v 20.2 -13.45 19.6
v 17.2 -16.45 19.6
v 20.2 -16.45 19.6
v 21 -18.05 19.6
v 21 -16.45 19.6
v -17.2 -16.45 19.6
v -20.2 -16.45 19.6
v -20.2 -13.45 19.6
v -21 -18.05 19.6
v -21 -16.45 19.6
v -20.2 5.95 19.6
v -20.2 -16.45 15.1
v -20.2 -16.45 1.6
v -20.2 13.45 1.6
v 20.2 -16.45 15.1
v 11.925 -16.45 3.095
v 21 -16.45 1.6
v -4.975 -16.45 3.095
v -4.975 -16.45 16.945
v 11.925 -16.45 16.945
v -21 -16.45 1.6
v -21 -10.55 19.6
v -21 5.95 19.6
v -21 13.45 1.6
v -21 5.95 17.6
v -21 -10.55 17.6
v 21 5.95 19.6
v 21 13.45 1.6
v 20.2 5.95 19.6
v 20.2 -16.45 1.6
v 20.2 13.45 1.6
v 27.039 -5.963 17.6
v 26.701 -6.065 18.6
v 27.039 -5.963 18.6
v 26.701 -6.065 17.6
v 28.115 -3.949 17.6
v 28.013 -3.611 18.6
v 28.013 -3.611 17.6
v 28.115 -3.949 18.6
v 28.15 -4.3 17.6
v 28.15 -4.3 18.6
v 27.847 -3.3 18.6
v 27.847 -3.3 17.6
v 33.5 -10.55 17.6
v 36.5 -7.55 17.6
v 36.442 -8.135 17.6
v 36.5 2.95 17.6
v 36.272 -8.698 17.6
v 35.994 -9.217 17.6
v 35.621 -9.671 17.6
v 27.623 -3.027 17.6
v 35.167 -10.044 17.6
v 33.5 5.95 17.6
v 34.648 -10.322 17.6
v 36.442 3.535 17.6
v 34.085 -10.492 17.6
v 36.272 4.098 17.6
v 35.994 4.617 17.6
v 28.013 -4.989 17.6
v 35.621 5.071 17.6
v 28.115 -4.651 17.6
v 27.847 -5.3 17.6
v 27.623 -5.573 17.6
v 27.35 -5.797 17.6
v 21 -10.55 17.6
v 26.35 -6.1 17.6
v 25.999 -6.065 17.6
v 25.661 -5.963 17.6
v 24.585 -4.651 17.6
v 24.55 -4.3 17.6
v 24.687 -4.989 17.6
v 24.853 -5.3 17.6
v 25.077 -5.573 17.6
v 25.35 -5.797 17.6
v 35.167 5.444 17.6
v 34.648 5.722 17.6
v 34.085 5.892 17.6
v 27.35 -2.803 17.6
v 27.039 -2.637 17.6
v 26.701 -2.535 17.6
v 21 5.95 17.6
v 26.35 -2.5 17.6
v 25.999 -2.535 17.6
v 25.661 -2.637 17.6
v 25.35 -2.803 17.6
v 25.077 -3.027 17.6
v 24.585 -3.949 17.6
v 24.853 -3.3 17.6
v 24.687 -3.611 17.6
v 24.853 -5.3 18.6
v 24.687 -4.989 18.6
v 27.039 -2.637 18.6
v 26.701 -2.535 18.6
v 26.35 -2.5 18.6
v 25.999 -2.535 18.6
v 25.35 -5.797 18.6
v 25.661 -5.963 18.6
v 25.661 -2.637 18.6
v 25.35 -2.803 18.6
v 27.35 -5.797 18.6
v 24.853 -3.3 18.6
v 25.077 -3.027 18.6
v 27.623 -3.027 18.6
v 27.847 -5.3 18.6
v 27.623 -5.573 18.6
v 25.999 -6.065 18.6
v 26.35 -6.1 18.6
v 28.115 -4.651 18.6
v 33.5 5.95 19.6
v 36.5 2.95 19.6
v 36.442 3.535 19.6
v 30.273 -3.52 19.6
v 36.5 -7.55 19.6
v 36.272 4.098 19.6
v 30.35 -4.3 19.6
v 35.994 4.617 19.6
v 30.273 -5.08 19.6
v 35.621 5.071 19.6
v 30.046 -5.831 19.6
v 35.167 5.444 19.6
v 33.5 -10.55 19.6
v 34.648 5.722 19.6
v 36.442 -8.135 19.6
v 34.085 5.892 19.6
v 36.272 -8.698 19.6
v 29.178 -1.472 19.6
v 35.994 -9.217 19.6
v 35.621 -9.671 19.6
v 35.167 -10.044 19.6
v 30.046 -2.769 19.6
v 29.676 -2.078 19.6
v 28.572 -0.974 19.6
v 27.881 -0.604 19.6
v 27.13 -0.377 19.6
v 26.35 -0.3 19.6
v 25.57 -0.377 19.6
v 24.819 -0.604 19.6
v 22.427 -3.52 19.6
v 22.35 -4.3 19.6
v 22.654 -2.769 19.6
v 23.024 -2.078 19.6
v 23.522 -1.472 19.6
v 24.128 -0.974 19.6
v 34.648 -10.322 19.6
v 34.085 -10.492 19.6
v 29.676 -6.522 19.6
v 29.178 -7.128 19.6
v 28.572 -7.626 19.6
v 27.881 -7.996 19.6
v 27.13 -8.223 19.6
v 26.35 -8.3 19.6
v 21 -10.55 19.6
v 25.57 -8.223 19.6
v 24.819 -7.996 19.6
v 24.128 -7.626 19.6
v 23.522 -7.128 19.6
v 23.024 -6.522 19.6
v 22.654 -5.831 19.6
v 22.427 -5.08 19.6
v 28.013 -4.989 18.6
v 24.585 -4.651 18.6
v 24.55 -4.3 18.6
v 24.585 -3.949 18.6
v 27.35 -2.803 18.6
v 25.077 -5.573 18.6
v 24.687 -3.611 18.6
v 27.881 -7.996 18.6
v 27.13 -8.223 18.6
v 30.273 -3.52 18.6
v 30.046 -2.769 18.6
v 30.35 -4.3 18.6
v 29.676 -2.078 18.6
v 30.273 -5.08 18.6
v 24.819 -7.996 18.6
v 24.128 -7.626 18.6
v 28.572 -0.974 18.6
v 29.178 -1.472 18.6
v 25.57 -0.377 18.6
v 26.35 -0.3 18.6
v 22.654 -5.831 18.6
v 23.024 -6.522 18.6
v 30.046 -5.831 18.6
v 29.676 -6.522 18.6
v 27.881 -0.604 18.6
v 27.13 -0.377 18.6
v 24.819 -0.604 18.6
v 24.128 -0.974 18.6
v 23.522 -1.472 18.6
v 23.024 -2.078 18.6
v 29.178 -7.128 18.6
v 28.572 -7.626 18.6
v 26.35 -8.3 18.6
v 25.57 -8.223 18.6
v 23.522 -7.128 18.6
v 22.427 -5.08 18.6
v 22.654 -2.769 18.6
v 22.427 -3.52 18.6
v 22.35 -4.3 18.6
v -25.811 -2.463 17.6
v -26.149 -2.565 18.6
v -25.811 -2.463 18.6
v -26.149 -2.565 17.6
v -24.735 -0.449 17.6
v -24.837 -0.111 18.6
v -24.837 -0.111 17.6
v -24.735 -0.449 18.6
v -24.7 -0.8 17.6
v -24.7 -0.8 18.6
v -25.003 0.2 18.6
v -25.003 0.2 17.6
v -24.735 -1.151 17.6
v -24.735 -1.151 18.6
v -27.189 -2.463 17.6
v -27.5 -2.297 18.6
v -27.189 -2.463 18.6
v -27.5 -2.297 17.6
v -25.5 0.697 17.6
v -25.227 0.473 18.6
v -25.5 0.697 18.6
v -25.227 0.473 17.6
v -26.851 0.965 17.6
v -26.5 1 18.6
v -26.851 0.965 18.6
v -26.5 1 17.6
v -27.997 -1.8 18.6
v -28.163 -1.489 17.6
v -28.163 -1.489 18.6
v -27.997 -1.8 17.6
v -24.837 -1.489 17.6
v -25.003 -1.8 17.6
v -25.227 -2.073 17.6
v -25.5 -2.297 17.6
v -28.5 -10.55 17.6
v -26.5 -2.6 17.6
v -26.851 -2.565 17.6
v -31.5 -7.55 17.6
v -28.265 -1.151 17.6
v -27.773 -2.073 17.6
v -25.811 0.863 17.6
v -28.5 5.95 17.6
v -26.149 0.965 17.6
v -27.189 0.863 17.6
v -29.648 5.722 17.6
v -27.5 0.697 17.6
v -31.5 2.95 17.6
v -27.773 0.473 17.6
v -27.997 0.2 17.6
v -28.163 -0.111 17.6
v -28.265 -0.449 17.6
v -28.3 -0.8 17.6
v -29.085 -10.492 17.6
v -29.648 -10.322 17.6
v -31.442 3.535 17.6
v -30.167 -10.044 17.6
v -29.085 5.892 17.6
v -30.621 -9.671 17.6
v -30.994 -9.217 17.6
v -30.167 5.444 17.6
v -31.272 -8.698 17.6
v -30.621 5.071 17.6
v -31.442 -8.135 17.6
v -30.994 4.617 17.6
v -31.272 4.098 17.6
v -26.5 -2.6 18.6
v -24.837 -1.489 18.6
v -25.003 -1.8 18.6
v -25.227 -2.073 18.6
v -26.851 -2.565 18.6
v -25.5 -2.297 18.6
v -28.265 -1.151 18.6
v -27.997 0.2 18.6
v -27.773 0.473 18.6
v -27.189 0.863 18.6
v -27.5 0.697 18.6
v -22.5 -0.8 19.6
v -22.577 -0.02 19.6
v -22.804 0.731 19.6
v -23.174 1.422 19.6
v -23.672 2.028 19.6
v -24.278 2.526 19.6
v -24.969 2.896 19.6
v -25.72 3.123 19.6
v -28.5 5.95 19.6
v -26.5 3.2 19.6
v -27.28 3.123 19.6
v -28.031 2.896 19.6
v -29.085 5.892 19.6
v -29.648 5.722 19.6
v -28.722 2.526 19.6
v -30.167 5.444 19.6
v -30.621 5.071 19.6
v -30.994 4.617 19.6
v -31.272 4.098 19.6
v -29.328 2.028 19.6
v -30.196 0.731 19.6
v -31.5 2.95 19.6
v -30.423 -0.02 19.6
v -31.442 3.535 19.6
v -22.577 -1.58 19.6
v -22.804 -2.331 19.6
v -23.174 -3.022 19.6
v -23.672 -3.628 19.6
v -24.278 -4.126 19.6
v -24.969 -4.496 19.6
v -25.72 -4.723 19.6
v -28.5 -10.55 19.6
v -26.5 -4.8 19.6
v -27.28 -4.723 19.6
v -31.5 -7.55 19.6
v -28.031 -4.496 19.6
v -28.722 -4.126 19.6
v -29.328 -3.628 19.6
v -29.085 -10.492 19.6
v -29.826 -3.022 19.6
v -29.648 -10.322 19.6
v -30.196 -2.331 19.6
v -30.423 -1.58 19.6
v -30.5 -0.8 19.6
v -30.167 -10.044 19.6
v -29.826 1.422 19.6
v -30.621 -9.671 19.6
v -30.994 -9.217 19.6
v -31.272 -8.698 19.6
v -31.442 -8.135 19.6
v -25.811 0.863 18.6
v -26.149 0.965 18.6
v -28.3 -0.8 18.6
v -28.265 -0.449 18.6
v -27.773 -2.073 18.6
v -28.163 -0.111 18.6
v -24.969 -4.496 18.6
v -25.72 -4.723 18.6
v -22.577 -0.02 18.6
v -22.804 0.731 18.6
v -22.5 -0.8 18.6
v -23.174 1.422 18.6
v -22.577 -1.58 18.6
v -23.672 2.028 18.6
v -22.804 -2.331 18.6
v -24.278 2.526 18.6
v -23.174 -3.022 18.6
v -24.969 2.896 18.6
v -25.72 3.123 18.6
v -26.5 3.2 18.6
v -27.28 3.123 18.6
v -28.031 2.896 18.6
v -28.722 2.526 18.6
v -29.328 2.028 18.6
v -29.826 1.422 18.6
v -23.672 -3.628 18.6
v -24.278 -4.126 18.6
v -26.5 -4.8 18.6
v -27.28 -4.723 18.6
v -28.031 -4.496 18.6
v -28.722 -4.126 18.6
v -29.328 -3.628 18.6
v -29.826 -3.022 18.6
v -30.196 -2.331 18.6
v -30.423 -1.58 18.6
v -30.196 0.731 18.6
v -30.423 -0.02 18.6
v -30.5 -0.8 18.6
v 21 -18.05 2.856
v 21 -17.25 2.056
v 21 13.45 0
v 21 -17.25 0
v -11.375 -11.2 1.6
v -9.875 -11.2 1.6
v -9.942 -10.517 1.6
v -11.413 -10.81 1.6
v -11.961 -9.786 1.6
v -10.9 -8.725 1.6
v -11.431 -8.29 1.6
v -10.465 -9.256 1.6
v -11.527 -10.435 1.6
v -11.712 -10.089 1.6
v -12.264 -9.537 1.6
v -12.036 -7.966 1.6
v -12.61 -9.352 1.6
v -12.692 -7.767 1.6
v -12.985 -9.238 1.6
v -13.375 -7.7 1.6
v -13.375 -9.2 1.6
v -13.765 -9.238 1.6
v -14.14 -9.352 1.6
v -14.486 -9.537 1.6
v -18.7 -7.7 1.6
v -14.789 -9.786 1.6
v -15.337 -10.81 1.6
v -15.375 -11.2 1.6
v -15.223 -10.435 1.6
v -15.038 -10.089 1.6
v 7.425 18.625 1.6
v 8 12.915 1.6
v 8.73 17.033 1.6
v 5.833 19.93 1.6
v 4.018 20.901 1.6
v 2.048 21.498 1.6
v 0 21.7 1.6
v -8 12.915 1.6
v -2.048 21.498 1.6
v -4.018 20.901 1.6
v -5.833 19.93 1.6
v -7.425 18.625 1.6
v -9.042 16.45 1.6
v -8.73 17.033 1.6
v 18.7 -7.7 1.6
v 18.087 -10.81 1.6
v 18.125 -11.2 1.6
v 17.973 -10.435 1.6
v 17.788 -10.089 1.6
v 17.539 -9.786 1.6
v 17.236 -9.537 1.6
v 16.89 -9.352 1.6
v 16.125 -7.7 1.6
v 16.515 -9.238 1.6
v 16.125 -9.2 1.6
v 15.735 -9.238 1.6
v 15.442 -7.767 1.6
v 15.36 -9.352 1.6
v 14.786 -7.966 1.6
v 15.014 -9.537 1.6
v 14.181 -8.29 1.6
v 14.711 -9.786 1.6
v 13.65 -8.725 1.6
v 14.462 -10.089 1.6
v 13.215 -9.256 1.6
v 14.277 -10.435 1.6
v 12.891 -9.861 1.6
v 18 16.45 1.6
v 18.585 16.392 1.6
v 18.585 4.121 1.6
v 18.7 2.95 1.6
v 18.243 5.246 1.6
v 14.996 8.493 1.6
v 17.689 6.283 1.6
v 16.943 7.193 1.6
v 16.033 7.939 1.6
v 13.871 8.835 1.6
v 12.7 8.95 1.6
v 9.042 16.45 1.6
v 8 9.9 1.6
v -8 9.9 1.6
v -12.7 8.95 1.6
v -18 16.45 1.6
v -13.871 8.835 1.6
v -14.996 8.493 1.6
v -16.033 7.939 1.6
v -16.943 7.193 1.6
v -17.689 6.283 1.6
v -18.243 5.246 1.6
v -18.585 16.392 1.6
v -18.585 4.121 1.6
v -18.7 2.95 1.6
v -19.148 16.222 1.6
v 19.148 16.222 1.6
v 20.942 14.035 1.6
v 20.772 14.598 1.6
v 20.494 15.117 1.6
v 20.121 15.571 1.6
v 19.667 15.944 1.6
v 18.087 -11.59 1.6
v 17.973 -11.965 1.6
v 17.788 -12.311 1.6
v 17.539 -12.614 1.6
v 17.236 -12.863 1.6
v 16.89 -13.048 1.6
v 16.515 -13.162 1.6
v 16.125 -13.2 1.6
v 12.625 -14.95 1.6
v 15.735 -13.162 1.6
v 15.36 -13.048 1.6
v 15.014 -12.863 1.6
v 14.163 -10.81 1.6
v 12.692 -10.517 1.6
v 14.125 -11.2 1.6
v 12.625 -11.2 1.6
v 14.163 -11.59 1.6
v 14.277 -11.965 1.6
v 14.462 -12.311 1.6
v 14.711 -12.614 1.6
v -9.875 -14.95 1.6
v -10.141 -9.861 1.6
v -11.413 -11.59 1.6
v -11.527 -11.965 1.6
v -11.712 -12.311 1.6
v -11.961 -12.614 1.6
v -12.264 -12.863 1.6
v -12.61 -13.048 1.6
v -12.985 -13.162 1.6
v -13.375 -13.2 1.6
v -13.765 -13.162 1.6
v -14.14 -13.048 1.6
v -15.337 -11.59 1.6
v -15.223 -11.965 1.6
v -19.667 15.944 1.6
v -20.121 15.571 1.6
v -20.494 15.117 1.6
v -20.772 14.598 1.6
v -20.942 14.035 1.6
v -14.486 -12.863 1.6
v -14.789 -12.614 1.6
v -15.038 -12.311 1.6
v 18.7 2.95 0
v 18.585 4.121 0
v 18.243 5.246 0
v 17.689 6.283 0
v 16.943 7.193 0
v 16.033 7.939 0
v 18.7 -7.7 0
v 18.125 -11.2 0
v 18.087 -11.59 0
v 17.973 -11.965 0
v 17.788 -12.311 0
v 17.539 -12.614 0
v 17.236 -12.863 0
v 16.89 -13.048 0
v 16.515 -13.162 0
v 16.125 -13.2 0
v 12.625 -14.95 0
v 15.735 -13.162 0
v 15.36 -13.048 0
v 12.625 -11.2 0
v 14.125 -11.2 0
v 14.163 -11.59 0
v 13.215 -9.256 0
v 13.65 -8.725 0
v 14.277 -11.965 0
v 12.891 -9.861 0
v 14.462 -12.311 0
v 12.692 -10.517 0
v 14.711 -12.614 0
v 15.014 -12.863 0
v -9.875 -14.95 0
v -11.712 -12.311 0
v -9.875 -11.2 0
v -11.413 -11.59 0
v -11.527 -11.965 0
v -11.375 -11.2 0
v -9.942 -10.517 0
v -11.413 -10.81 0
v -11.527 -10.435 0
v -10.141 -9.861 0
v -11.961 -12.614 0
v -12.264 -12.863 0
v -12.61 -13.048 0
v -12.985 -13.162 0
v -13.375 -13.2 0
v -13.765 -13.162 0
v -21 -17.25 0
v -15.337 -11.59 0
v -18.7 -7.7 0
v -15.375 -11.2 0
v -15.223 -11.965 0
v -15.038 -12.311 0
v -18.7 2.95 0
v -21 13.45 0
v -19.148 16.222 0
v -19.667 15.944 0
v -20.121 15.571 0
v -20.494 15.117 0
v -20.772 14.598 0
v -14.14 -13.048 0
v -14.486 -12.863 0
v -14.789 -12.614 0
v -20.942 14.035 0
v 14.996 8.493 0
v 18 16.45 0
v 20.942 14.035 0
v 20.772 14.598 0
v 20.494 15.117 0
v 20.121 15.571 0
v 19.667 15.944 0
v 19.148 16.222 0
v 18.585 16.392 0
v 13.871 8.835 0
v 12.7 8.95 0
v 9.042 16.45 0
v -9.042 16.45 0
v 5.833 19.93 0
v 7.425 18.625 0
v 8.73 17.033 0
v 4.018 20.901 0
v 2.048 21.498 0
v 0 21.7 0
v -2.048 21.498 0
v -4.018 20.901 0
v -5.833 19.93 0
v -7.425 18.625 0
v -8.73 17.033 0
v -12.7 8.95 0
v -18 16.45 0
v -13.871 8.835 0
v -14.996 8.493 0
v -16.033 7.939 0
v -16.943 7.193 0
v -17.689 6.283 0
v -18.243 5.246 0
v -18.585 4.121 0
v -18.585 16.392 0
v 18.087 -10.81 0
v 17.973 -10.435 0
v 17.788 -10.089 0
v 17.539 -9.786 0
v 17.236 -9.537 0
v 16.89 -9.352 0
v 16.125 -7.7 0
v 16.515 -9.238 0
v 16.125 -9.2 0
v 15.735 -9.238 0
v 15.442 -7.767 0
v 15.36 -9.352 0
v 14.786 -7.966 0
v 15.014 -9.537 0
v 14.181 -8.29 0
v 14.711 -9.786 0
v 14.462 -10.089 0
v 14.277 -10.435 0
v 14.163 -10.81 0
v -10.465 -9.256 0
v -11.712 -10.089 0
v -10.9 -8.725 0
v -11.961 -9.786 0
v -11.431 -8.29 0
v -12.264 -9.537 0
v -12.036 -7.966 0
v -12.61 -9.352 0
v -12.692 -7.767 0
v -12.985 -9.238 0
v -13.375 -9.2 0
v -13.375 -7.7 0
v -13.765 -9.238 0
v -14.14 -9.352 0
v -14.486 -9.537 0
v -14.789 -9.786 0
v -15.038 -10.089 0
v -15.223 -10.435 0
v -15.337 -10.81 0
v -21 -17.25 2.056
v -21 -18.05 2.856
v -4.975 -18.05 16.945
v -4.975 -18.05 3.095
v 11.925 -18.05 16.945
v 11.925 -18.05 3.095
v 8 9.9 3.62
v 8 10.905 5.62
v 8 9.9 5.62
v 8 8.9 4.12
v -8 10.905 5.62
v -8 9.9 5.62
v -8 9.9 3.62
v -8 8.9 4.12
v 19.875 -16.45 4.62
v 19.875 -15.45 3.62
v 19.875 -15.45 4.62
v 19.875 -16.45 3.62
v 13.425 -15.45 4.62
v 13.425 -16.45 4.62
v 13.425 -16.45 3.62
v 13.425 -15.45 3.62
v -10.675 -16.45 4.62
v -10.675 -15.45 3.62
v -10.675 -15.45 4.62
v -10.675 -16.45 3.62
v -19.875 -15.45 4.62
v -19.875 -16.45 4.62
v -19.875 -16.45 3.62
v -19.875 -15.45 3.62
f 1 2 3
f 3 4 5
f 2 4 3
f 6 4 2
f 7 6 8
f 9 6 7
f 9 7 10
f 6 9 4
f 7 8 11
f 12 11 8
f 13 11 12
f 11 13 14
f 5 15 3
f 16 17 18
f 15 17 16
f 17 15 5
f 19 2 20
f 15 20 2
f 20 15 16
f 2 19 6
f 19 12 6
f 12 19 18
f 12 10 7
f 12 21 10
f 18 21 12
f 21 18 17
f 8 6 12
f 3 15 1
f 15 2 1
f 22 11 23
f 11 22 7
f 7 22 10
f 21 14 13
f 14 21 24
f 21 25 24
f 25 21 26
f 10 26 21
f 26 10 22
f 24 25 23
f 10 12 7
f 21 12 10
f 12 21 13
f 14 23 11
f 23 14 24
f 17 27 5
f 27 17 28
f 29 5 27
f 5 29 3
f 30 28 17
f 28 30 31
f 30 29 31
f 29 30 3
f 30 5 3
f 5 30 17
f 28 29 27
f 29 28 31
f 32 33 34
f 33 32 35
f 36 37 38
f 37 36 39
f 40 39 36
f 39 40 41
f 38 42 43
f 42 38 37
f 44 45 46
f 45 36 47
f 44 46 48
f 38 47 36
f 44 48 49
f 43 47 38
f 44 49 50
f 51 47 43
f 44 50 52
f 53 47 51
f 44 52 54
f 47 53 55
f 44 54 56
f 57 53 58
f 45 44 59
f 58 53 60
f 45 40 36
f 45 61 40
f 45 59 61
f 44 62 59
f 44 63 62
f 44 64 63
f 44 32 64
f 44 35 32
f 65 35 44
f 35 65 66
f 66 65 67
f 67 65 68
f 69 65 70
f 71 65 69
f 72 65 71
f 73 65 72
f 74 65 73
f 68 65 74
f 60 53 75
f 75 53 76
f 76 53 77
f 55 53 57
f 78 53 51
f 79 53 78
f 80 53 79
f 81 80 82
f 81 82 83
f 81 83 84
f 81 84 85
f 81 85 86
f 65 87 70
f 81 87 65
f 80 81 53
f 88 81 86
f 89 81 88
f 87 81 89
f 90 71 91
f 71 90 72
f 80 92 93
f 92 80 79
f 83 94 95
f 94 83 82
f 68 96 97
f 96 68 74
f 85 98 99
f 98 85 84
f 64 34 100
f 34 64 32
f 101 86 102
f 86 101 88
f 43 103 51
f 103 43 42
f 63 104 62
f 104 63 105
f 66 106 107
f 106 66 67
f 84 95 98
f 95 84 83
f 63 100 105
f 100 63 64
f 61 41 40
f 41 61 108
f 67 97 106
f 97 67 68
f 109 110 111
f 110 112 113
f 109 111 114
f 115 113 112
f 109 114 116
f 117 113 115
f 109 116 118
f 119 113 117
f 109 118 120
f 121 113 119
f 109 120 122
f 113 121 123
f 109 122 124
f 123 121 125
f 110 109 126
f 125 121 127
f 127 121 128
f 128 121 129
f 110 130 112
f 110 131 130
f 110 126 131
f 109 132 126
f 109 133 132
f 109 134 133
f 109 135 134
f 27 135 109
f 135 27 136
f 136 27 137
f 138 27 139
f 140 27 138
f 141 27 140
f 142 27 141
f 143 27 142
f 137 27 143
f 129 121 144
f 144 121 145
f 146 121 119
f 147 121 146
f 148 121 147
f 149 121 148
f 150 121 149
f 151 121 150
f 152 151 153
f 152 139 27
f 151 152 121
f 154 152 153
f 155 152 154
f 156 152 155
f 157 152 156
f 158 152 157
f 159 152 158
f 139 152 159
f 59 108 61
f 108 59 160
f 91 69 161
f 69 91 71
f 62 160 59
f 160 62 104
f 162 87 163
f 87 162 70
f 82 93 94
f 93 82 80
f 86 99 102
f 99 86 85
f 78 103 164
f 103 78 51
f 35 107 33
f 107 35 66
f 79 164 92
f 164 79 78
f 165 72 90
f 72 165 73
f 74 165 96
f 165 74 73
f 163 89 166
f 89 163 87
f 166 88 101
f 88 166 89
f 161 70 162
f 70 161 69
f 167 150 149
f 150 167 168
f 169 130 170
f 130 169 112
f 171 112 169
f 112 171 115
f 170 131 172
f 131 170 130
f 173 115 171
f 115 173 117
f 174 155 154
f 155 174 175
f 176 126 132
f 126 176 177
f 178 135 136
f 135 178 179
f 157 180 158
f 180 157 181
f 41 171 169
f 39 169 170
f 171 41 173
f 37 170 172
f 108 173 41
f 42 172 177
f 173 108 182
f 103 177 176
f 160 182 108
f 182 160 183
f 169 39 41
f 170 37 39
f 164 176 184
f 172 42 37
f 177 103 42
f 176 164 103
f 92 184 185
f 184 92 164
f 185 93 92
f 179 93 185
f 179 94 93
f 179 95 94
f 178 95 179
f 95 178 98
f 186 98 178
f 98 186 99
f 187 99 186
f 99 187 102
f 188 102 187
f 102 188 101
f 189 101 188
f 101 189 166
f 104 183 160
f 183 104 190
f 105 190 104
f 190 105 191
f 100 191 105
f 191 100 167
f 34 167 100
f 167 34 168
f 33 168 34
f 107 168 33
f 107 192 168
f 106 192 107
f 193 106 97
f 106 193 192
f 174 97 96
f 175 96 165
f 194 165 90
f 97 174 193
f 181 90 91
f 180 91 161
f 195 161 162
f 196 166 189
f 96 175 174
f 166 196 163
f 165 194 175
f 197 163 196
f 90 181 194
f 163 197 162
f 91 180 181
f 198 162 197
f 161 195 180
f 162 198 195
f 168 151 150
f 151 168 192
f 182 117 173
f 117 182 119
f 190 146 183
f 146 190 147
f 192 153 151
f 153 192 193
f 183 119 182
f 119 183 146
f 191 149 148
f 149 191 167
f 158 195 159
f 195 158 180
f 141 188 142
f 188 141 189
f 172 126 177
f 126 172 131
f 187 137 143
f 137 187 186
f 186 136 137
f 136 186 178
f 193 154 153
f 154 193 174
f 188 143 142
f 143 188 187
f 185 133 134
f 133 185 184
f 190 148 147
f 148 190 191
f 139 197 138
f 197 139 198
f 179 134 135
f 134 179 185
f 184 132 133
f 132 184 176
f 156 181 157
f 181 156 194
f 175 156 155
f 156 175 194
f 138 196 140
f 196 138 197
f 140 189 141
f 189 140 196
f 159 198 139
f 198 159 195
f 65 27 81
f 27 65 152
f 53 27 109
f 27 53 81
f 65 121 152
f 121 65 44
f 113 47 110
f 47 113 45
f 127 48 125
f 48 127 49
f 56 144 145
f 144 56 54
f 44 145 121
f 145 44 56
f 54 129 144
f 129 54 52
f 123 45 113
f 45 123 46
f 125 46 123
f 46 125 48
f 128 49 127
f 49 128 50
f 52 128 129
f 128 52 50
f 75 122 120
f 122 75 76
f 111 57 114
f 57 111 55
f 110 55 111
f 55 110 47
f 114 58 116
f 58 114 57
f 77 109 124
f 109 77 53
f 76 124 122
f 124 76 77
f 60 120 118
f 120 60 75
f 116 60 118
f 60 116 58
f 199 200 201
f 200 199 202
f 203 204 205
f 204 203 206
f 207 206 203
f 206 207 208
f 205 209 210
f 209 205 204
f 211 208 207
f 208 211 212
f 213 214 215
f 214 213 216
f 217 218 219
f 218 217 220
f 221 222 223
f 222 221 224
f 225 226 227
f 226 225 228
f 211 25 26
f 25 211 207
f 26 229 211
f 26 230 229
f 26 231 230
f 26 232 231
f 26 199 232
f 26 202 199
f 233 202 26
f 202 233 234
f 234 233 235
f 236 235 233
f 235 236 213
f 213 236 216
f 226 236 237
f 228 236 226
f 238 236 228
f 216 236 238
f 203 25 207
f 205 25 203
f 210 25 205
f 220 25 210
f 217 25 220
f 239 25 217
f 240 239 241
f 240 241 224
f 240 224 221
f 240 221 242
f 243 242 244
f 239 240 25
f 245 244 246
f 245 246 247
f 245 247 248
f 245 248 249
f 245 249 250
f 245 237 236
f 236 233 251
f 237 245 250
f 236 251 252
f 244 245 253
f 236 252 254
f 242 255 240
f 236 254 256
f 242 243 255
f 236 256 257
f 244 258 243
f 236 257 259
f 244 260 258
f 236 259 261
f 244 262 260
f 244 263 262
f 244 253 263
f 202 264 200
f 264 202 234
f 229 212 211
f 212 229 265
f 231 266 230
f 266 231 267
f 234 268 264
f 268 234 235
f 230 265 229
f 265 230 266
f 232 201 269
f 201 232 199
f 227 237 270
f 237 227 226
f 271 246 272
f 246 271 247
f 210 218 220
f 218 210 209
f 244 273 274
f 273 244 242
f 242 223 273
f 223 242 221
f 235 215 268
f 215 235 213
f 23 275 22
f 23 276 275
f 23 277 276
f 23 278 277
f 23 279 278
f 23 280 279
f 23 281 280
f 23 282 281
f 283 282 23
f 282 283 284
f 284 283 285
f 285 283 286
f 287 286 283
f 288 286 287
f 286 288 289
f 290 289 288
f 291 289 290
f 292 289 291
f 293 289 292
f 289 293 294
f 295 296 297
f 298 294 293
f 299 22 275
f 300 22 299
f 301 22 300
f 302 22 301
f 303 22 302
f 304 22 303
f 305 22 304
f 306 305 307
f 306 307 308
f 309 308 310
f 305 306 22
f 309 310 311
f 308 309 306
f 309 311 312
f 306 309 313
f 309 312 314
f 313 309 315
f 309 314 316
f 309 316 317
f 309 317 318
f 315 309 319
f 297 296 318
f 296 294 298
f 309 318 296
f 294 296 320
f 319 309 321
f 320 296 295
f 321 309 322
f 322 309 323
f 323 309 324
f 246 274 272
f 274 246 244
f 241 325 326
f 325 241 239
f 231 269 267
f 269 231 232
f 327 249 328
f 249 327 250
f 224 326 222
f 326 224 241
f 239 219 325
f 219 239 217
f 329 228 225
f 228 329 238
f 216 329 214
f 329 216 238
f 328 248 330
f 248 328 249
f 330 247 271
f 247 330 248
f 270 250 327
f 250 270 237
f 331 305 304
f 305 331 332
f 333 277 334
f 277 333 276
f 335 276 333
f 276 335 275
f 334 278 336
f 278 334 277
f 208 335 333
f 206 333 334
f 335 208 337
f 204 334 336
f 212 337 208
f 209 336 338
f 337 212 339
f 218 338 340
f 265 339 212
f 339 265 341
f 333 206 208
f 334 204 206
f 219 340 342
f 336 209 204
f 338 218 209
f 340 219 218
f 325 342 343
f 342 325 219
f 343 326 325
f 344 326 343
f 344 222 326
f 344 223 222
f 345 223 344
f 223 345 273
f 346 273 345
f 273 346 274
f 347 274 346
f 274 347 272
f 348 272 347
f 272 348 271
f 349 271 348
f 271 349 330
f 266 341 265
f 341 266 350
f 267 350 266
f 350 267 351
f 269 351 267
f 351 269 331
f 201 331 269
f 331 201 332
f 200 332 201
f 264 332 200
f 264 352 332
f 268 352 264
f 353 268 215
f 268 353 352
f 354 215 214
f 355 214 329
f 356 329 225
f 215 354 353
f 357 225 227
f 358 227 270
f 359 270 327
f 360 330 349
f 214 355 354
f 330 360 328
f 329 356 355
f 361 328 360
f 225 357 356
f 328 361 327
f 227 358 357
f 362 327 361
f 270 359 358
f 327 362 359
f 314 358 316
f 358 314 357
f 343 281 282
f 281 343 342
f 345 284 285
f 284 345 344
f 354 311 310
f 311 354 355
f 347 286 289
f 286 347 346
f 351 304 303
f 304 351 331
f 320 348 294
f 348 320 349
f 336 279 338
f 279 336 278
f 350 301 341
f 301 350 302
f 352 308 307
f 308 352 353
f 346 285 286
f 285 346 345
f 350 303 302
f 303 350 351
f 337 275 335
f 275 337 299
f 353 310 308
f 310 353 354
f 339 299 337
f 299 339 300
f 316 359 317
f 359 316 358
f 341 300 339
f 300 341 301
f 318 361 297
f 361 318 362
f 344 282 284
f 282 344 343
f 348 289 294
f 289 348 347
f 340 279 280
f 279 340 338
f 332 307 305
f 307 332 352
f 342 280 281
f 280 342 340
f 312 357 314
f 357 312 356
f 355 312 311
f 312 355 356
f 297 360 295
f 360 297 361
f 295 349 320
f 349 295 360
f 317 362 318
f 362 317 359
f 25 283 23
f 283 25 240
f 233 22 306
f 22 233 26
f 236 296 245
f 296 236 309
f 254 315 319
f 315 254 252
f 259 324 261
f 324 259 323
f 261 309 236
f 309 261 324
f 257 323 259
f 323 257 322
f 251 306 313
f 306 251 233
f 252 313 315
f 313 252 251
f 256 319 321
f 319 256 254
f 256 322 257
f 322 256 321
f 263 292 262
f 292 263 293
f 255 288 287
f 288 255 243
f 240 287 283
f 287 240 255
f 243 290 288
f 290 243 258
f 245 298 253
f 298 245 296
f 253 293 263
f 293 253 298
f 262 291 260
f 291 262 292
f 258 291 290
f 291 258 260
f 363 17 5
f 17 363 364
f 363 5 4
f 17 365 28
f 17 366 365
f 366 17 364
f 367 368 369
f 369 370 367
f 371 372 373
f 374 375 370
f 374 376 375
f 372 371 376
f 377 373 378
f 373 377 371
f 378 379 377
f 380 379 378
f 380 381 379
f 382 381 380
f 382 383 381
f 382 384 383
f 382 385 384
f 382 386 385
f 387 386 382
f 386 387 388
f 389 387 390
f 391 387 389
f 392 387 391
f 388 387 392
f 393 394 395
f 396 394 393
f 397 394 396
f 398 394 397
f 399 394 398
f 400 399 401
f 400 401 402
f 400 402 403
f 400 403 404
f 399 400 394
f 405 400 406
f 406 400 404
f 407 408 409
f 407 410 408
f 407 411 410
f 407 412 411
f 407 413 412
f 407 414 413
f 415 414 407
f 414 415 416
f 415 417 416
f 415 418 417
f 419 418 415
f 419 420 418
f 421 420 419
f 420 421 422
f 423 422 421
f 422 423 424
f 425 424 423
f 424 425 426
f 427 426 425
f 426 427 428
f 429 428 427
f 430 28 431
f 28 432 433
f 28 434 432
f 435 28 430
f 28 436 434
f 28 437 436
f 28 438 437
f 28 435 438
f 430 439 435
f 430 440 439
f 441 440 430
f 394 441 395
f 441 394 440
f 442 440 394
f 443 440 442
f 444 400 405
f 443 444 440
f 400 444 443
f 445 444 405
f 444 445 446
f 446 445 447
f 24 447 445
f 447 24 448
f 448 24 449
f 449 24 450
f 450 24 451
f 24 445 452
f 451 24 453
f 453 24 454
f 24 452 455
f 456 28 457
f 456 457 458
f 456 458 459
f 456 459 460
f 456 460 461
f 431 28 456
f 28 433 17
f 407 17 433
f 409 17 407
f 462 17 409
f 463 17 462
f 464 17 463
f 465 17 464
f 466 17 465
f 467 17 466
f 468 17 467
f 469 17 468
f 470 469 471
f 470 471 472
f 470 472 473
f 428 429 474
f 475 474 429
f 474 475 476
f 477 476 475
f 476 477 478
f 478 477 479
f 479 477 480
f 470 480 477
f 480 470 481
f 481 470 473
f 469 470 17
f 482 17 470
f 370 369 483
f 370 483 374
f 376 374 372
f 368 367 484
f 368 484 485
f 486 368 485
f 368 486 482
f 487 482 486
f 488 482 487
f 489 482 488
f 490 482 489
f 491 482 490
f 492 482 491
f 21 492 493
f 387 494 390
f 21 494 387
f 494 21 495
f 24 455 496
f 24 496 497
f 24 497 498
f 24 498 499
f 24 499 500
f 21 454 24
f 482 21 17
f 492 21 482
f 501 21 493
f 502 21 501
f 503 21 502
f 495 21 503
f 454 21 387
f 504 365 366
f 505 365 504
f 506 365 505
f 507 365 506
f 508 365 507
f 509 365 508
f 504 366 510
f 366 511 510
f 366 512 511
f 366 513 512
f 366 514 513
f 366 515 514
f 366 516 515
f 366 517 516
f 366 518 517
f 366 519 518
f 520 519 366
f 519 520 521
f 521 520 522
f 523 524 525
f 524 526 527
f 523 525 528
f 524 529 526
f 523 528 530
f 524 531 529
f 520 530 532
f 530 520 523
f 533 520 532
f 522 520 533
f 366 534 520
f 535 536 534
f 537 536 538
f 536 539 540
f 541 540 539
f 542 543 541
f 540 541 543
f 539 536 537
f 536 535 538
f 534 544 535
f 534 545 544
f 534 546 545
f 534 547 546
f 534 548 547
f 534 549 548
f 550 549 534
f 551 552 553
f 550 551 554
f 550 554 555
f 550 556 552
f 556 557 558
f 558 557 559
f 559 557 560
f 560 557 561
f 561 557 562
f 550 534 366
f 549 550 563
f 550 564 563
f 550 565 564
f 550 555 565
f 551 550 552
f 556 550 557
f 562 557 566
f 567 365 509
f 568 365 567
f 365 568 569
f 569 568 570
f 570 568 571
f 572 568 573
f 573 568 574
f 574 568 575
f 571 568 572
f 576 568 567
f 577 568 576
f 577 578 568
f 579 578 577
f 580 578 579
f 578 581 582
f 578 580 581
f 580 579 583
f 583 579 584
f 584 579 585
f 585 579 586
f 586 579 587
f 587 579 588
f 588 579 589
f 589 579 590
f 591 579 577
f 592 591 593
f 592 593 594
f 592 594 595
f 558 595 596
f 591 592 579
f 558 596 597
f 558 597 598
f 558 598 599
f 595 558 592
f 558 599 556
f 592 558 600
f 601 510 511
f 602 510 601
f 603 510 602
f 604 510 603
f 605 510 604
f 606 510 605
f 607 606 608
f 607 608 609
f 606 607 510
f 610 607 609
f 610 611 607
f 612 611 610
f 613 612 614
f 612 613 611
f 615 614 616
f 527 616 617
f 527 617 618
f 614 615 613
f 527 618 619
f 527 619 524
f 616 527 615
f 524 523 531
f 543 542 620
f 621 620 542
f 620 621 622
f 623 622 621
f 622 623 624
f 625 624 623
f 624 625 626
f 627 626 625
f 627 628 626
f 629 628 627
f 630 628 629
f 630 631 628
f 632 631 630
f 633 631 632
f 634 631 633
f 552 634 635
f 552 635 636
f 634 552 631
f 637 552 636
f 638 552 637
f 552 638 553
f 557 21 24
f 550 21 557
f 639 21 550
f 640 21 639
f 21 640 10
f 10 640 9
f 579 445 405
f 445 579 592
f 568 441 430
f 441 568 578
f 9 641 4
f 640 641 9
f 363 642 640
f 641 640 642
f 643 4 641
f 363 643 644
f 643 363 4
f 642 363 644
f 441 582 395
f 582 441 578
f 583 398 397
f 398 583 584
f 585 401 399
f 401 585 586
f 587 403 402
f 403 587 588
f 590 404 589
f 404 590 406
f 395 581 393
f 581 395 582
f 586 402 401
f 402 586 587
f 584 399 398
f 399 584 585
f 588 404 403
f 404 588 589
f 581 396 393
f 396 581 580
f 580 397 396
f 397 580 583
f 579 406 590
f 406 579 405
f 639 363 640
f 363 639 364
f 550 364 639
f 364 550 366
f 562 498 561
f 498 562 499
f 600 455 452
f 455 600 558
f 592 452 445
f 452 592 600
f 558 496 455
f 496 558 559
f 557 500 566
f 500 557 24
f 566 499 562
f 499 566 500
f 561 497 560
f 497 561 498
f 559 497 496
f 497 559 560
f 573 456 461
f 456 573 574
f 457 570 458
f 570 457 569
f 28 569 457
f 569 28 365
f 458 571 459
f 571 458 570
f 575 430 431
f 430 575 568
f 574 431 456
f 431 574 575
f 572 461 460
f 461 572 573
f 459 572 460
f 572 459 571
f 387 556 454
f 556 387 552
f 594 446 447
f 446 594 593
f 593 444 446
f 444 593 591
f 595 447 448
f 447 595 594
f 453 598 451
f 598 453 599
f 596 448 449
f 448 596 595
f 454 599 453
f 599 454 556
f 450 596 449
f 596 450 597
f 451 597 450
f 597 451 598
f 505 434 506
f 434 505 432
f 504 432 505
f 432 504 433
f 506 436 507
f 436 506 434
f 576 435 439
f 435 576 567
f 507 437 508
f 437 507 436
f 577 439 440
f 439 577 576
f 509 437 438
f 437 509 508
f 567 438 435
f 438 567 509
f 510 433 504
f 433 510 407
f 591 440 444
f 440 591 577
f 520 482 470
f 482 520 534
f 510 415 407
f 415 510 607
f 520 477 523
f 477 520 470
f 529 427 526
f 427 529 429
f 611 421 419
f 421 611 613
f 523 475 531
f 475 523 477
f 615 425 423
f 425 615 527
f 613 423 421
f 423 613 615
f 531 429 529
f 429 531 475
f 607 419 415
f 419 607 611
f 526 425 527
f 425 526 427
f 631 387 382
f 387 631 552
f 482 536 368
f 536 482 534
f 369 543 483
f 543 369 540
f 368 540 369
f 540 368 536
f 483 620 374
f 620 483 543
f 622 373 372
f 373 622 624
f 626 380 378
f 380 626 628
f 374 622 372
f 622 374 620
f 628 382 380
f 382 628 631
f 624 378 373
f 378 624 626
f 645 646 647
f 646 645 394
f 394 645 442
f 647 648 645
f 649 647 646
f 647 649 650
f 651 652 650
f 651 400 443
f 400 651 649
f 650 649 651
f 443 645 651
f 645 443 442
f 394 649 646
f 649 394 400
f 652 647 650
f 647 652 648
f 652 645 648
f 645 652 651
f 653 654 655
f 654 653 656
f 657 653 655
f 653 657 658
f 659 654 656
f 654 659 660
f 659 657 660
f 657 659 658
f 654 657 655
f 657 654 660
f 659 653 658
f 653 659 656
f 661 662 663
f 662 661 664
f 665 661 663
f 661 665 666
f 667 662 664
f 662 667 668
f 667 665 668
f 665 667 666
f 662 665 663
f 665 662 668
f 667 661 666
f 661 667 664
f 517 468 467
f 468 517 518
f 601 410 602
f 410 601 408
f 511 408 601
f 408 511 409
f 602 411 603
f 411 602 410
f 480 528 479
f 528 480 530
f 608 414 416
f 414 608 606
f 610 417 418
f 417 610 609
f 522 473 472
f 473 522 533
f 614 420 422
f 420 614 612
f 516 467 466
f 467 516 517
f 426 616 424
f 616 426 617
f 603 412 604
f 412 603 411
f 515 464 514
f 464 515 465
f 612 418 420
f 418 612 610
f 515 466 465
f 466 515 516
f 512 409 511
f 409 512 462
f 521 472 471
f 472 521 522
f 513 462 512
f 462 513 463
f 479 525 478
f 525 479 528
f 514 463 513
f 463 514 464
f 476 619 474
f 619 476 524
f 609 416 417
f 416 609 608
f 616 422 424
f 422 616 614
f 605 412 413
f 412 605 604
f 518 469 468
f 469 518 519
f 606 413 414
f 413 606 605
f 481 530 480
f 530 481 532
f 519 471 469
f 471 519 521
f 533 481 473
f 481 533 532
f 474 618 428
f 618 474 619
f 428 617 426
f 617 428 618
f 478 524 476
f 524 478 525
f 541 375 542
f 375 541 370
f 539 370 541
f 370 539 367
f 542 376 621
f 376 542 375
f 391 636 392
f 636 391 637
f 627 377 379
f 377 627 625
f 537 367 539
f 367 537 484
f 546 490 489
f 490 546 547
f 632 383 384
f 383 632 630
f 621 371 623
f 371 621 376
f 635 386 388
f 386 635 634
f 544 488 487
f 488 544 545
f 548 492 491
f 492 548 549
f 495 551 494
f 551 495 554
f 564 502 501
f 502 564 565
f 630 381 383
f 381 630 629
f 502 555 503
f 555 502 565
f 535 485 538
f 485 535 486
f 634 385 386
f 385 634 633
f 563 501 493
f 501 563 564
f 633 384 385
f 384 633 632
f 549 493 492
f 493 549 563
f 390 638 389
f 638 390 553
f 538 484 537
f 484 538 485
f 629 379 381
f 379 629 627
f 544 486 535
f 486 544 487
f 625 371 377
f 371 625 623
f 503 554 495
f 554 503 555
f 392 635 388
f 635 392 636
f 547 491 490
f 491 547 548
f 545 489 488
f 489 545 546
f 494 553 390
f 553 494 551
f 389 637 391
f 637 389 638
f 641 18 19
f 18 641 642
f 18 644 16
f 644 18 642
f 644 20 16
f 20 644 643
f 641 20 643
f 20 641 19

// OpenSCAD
// file: hash.scad
//
// Copyright (c) Stewart H. Whitman, 2020-2021.
//
// File:    hash.scad
// Project: General
// License: CC BY-NC-SA 4.0 (Attribution-NonCommercial-ShareAlike)
// Desc:    Implementation of a hash associative array.
//

// hash can be initialized like:
//
//   config = hash_add( hash_add( hash_add( hash_add( hash_initialize(), "first_name", "Bob" ), "last_name", "Doe" ), "age", 50 ), "kids", [ "Jane", "John" ] );
//
// or perhaps more simply like:
//
//   config = [
//     [ "first_name", "Bob" ],
//     [ "last_name", "Doe" ],
//     [ "age", 50 ],
//     [ "kids", [ "Jane", "John" ] ],
//   ];
//
// Then values can be retrieved by:
//
//   echo( hash_get( config, "first_name" ) ); // -> "Bob"
//
// Default values can be obtained as follows if the key is missing from the hash:
//
//   echo( hash_get_default( config, "age", 0 ) ); // -> 50
//   echo( hash_get_default( config, "occupation", "unknown" ) ); // -> "unknown"
//
// Or, you can have an entire hash of default values to fallback on:
//
//   default_config = [
//     [ "first_name", "none" ],
//     [ "last_name", "none" ],
//     [ "age", -1 ],
//     [ "occupation", "unknown" ],
//     [ "kids", [] ],
//   ];
//
//   echo( hash_get_default_hash( config, "age", default_config ) ); // -> 50
//   echo( hash_get_default_hash( config, "occupation", default_config ) ); // -> "unknown"
//
// Functions like 'hash_set' and 'hash_delete' require you to assign the returned result
// to a new variable, since openscad does not have true variables.
//
//   anon_config = hash_delete( hash_delete( config, "first_name" ), "last_name" );
//   echo( hash_exists( anon_config, "first_name" ) ); // -> false
//
// Most of the other functions are obvious.
//

// hash_initialize:
//
// Returns initialization of a hash.
//
function hash_initialize() = [];

// hash_add:
//
// Adds <key>:<value> to <hash>. This does not check for duplicates. Use hash_set to remove duplicates.
//
function hash_add( hash, key, value ) = assert( is_list(hash) ) is_undef(key) ? hash : concat( hash, [[key, value]] );

// hash_size:
//
// Returns the size of <hash>.
//
function hash_size( hash ) = assert( is_list(hash) ) len(hash);

// hash_is_empty:
//
// Returns true if <hash> is empty.
//
function hash_is_empty( hash ) = assert( is_list(hash) ) len(hash) == 0;

// hash_keys:
//
// Return the keys of <hash> in an array.
//
function hash_keys( hash ) = assert( is_list(hash) ) [ for( i = hash ) i[0] ];

// hash_values:
//
// Return the values of <hash> in an array.
//
function hash_values( hash ) = assert( is_list(hash) ) [ for( i = hash ) i[1] ];

// hash_get:
//
// Returns the value associated with key <key> from <hash> or undef if it does not exist.
//
function hash_get( hash, key ) = assert( is_list(hash) ) hash[ search( [key], hash, 1, 0 )[0] ][1];

// hash_exists:
//
// Returns true if the key <key> exists in <hash>.
//
function hash_exists( hash, key ) = assert( is_list(hash) ) search( [key], hash, 1, 0 ) != [[]];

// hash_get_default:
//
// Returns the value associated with key <key> from <hash> or <default_value> if it does not exist.
//
function hash_get_default( hash, key, default_value ) = hash_exists( hash, key ) ? hash_get( hash, key ) : default_value;

// hash_get_default_hash:
//
// Returns the value associated with key <key> from <hash>, falling back to <default_hash> if it does not exist.
//
function hash_get_default_hash( hash, key, default_hash ) = hash_exists( hash, key ) ? hash_get( hash, key ) : hash_get( default_hash, key );

// hash_delete:
//
// Deletes key <key> from <hash> if it exists and returns the new hash.
//
function hash_delete( hash, key ) = assert( is_list(hash) ) [ for( i = hash ) if( key != i[0] ) i ];

// hash_set:
//
// Set key <key> to associated <value> in <hash>, deleting it if it already exists,  and returns the new hash.
//
function hash_set( hash, key, value ) = hash_exists( hash, key ) ? hash_add( hash_delete( hash, key ), key, value ) : hash_add( hash, key, value );
// file: primitives.scad
//
// Copyright (c) Stewart H. Whitman, 2020-2021.
//
// File:    primitives.scad
// Project: Dell Wyse 5070 2nd Ethernet Adapter Adapter
// License: CC BY-NC-SA 4.0 (Attribution-NonCommercial-ShareAlike)
// Desc:    Shape primitives
//
// $Header$
//

include <smidge.scad>;

// Creates a right triangle with <height> and <base> and extrudes it
// to <thickness>.
//
module right_triangle(height, base, thickness) {
  translate( [+thickness,0,0] ) rotate( [0,-90,0] ) linear_extrude( height=thickness ) polygon( [[0,0], [0,height], [base,0]] );
} // end right_triangle

// Create a half cylinder
module half_cylinder(r,h,center=false) {
  translate( [center ? -h/2 : 0, 0, 0] )
    rotate( [90,0,0] ) rotate( [0,90,0] )
    difference() {
      cylinder( r=r, h=h );
      translate( [-2*r,-r, -SMIDGE ] ) cube( [ 2*r,2*r,h+2*SMIDGE] );
    }
} // end half_cylinder

// Create a triangle with 2 sides the same
module equi_triangle(height_and_base, thickness,center=false) {
  translate( [ center ? -thickness/2 : 0, 0, 0 ] ) {
    right_triangle(height_and_base, height_and_base, thickness);
    mirror( [0,0,1] ) right_triangle(height_and_base, height_and_base, thickness);
  }
} // end equi_triangle

// Create a somewhat complex tang (a right triangle over a cube)
module tang(l,h,w,percent=25,center=false) {
  assert( percent > 0 && percent < 100 );
  //echo( ["tang",l,w,h,percent] );

  p = percent/100;

  translate( [-w/2,0,center?-h/2 : 0] ) {
    translate( [0,0,p*h] )
      right_triangle(l,(1-p)*h,w);
    cube( [w,l,p*h] );
  }
} // end tang

// Create a somewhat complex tang (a right triangle over another triangle)
module tang2(l,h,w,percent=25,center=false) {
  assert( percent > 0 && percent < 100 );
  //echo( ["tang2",l,h,w,percent] );

  p = percent/100;

  translate( [-w/2,0,center?-h/2 : 0] ) {
    translate( [0,0,p*h] )
      right_triangle(l,(1-p)*h,w);
    translate( [0,0,p*h] )
      mirror( [0,0,1] ) right_triangle(l,p*h,w);
  }
} // end tang2

// Create a gusset (pyramid that fits in corner)
module gusset(width,height=0,center=true) {
  w = width;
  h = height == 0 ? w : height;
  translate( [0,0,center?-h/2:0] )
    polyhedron( points=[[0,0,0], [w,0,h], [0,0,h], [0,w,h]],
                faces=[[1,2,3],[0,1,3],[0,2,1],[0,3,2]] );
} // end gusset

// A corner rounding shape for a designated corner (on the XY plane)...
module round_corner_xy(radius,v,direction) {
  assert( direction >= 0 && direction <= 3 );

  if( radius > 0 ) {
    // Additional amount on Z
    z_multiplier = 2;
    z_translate  = [ [-1, -1, 0], [+1, -1, 0], [+1, +1, 0], [-1, +1, 0] ];

    // Get an inverted quarter pie slice
    color( "purple" )
    translate( [v.x,v.y,0] )
      translate( z_translate[direction]*radius )
	rotate( [0,0,90*direction] )
	  difference() {
	    translate( [0,0,-v.z*z_multiplier/4] ) cube( [radius+SMIDGE,radius+SMIDGE,v.z*z_multiplier] );
	    translate( [0,0,v.z*z_multiplier/4] ) cylinder( v.z*z_multiplier+SMIDGE, r=radius, center=true );
	  }
  }
} // end round_corner_xy

// A corner rounding shape for a designated corner (on the YZ plane)...
module round_corner_yz(radius,v,direction) {
  assert( direction >= 0 && direction <= 3 );

  if( radius > 0 ) {
    // Additional amount on X
    x_multiplier = 2;
    x_translate  = [ [0, -1, +1], [0, -1, -1], [0, +1, -1], [0, +1, +1] ];

    // Get an inverted quarter pie slice
    color( "purple" )
      translate( [0,v.y,v.z] )
	translate( x_translate[direction]*radius )
	  rotate( [90*direction,0,0] )
	  rotate( [0,90,0] )
	    difference() {
	      translate( [0,0,-v.x*x_multiplier/4] ) cube( [radius+SMIDGE,radius+SMIDGE,v.x*x_multiplier] );
	      translate( [0,0,v.x*x_multiplier/4] ) cylinder( v.x*x_multiplier+SMIDGE, r=radius, center=true );
	    }
  }
} // end round_corner_yz

// A corner rounding shape for a designated corner (on the XZ plane)...
module round_corner_xz(radius,v,direction) {
  assert( direction >= 0 && direction <= 3 );

  if( radius > 0 ) {
    // Additional amount on Y
    y_multiplier = 2;
    y_translate  = [ [-1, 0, -1], [-1, 0, +1], [+1, 0, +1], [+1, 0, -1] ];

    // Get an inverted quarter pie slice
    color( "purple" )
      translate( [v.x,0,v.z] )
	translate( y_translate[direction]*radius )
	  rotate( [0,90*direction,0] )
	  rotate( [90,0,0] )
	    difference() {
	      translate( [0,0,-v.y*y_multiplier/4] ) cube( [radius+SMIDGE,radius+SMIDGE,v.y*y_multiplier] );
	      translate( [0,0,v.y*y_multiplier/4] ) cylinder( v.y*y_multiplier+SMIDGE, r=radius, center=true );
	    }
  }
} // end round_corner_xz
// file: smidge.scad
//
// Copyright (c) Stewart H. Whitman, 2020-2021.
//
// File:    smidge.scad
// Project: General
// License: CC BY-NC-SA 4.0 (Attribution-NonCommercial-ShareAlike)
// Desc:    SMIDGE constant used in preview mode.
//

// Smidge constant for rendering only (to avoid Z-axis fighting, etc.)
SMIDGE = $preview ? 0.01 : 0;
// file: iocrest-nic.scad
//
// Copyright (c) Stewart H. Whitman, 2020-2023.
//
// File:    iocrest-nic.scad
// Project: Dell Wyse 5070 2nd Ethernet Adapter Adapter
// License: CC BY-NC-SA 4.0 (Attribution-NonCommercial-ShareAlike)
// Desc:    Mock-up of the very common Realtek RTL8111 Daughter Board
//

include <smidge.scad>;

// IOCREST Realtek Mini PCI-Express Daughter board layout
//
// Part Number: IOCREST IO-M2F8111H-GLAN
//
// The problem with these boards are that the cables are
// large and bulk, so the connectors may need changing out to
// right-angle ones.
//

//
// All these values were measured.
//

// kind:
//
// Unique, for customization.
//
function nic_kind() = "iocrest";

// PCB thickness ~1.57mm (nominal 4-layer PCB thickness)
// PCB width X length as measured (about 1.5" x 1")
function nic_get_pcb_size() = [ 39.75, 26.1, 1.57 ];

// bottom hole positions [left=0, rear=0]
function _nic_get_left_hole() = [ 3.75, nic_get_pcb_size().y - 5.25];
function _nic_get_right_hole() = [ 33.25, nic_get_pcb_size().y - 5.25];
function nic_get_bottom_holes() = [ _nic_get_left_hole(), _nic_get_right_hole() ];
// bottom hole diameter
function nic_get_bottom_hole_diameter() = 3.6;

// ethernet size [left<->right,front<->rear,top<->bottom]
function nic_get_ethernet_size() = [16.30,15.75,13.25];

// ethernet position measures 8.25mm from left side
function _nic_get_ethernet_left_pos() = 8.25;
function _nic_get_ethernet_right_pos() = _nic_get_ethernet_left_pos()+nic_get_ethernet_size().x;
function _nic_get_ethernet_bottom_pos() = nic_get_pcb_size().z;
function nic_get_ethernet_center_pos() = [ (_nic_get_ethernet_left_pos()+_nic_get_ethernet_right_pos())/2, _nic_get_ethernet_bottom_pos() + nic_get_ethernet_size().z/2 ];
function nic_get_ethernet_projection() = 12.0 + nic_get_ethernet_size().y - nic_get_pcb_size().y;

// shield (none)
function nic_get_shield_thickness() = 0;
function nic_get_shield_size() = [];
function nic_get_shield_hole_diameter() = 0;
function nic_get_shield_holes() = [];
function nic_get_shield_center_pos() = [ 0, 0 ];

// ethernet is equidistant from left or right side (about 7.5mm)
// Layout of the nic board (PCB centered with NIC port hanging out)
module nic(transparency=1.0,center=true,with_shield=true) {

  module hole() {
    translate( [0,0,-SMIDGE] ) cylinder( h = nic_get_pcb_size().z+2*SMIDGE, d=nic_get_bottom_hole_diameter() );
  } // end hole

  // pcb with notch and hole
  module pcb() {
    color( "green", transparency )
      difference() {
	// board
	cube( nic_get_pcb_size() );
	// notch
	translate( [-SMIDGE,-SMIDGE,-SMIDGE] ) cube( nic_get_pcb_size() - [29.5-SMIDGE, 14.25-SMIDGE, -2*SMIDGE] );
        // holes
        for( h = nic_get_bottom_holes() )
	  translate( concat( h, 0 ) ) hole();
      }
  } // end pcb

  module ethernet() {
    color( "silver", transparency )
      translate( [_nic_get_ethernet_left_pos(),12.0,nic_get_pcb_size().z] ) cube( nic_get_ethernet_size() );
    color( "black", transparency ) {
      h = 3.25;
      translate( [_nic_get_ethernet_left_pos()+1.8,nic_get_pcb_size().y-3.5,nic_get_pcb_size().z-h] ) cylinder( h=h, d=3.00 );
      translate( [_nic_get_ethernet_right_pos()-1.8,nic_get_pcb_size().y-3.5,nic_get_pcb_size().z-h] ) cylinder( h=h, d=3.00 );
    }
  } // end ethernet

  module header1() {
    color( "black", transparency )
      translate( [ 11.5, 4, -0.5 ] ) cube( [ 12.7, 5, 11] );
  } // end header1

  module header2() {
    color( "black", transparency )
      translate( [ 28, 4, -0.5 ] ) cube( [ 5.1, 5, 11] );
  } // end header2

  // entire nic
  translate( center ? -[nic_get_pcb_size().x,nic_get_pcb_size().y,0]/2 : [0,0,0] ) {
    pcb();
    ethernet();
    header1();
    header2();
  }
} // end nic

nic($fn=24);
// main file
//
// Copyright (c) Stewart H. Whitman, 2021-2023.
//
// File:    wyse-iocrest-adapter.scad
// Project: Dell Wyse 5070 2nd Ethernet Adapter Adapter
// License: CC BY-NC-SA 4.0 (Attribution-NonCommercial-ShareAlike)
// Desc:    Adapter that holds Realtek NIC Daughter-board
//

use <iocrest-nic.scad>
include <wyse-ethernet.scad>
